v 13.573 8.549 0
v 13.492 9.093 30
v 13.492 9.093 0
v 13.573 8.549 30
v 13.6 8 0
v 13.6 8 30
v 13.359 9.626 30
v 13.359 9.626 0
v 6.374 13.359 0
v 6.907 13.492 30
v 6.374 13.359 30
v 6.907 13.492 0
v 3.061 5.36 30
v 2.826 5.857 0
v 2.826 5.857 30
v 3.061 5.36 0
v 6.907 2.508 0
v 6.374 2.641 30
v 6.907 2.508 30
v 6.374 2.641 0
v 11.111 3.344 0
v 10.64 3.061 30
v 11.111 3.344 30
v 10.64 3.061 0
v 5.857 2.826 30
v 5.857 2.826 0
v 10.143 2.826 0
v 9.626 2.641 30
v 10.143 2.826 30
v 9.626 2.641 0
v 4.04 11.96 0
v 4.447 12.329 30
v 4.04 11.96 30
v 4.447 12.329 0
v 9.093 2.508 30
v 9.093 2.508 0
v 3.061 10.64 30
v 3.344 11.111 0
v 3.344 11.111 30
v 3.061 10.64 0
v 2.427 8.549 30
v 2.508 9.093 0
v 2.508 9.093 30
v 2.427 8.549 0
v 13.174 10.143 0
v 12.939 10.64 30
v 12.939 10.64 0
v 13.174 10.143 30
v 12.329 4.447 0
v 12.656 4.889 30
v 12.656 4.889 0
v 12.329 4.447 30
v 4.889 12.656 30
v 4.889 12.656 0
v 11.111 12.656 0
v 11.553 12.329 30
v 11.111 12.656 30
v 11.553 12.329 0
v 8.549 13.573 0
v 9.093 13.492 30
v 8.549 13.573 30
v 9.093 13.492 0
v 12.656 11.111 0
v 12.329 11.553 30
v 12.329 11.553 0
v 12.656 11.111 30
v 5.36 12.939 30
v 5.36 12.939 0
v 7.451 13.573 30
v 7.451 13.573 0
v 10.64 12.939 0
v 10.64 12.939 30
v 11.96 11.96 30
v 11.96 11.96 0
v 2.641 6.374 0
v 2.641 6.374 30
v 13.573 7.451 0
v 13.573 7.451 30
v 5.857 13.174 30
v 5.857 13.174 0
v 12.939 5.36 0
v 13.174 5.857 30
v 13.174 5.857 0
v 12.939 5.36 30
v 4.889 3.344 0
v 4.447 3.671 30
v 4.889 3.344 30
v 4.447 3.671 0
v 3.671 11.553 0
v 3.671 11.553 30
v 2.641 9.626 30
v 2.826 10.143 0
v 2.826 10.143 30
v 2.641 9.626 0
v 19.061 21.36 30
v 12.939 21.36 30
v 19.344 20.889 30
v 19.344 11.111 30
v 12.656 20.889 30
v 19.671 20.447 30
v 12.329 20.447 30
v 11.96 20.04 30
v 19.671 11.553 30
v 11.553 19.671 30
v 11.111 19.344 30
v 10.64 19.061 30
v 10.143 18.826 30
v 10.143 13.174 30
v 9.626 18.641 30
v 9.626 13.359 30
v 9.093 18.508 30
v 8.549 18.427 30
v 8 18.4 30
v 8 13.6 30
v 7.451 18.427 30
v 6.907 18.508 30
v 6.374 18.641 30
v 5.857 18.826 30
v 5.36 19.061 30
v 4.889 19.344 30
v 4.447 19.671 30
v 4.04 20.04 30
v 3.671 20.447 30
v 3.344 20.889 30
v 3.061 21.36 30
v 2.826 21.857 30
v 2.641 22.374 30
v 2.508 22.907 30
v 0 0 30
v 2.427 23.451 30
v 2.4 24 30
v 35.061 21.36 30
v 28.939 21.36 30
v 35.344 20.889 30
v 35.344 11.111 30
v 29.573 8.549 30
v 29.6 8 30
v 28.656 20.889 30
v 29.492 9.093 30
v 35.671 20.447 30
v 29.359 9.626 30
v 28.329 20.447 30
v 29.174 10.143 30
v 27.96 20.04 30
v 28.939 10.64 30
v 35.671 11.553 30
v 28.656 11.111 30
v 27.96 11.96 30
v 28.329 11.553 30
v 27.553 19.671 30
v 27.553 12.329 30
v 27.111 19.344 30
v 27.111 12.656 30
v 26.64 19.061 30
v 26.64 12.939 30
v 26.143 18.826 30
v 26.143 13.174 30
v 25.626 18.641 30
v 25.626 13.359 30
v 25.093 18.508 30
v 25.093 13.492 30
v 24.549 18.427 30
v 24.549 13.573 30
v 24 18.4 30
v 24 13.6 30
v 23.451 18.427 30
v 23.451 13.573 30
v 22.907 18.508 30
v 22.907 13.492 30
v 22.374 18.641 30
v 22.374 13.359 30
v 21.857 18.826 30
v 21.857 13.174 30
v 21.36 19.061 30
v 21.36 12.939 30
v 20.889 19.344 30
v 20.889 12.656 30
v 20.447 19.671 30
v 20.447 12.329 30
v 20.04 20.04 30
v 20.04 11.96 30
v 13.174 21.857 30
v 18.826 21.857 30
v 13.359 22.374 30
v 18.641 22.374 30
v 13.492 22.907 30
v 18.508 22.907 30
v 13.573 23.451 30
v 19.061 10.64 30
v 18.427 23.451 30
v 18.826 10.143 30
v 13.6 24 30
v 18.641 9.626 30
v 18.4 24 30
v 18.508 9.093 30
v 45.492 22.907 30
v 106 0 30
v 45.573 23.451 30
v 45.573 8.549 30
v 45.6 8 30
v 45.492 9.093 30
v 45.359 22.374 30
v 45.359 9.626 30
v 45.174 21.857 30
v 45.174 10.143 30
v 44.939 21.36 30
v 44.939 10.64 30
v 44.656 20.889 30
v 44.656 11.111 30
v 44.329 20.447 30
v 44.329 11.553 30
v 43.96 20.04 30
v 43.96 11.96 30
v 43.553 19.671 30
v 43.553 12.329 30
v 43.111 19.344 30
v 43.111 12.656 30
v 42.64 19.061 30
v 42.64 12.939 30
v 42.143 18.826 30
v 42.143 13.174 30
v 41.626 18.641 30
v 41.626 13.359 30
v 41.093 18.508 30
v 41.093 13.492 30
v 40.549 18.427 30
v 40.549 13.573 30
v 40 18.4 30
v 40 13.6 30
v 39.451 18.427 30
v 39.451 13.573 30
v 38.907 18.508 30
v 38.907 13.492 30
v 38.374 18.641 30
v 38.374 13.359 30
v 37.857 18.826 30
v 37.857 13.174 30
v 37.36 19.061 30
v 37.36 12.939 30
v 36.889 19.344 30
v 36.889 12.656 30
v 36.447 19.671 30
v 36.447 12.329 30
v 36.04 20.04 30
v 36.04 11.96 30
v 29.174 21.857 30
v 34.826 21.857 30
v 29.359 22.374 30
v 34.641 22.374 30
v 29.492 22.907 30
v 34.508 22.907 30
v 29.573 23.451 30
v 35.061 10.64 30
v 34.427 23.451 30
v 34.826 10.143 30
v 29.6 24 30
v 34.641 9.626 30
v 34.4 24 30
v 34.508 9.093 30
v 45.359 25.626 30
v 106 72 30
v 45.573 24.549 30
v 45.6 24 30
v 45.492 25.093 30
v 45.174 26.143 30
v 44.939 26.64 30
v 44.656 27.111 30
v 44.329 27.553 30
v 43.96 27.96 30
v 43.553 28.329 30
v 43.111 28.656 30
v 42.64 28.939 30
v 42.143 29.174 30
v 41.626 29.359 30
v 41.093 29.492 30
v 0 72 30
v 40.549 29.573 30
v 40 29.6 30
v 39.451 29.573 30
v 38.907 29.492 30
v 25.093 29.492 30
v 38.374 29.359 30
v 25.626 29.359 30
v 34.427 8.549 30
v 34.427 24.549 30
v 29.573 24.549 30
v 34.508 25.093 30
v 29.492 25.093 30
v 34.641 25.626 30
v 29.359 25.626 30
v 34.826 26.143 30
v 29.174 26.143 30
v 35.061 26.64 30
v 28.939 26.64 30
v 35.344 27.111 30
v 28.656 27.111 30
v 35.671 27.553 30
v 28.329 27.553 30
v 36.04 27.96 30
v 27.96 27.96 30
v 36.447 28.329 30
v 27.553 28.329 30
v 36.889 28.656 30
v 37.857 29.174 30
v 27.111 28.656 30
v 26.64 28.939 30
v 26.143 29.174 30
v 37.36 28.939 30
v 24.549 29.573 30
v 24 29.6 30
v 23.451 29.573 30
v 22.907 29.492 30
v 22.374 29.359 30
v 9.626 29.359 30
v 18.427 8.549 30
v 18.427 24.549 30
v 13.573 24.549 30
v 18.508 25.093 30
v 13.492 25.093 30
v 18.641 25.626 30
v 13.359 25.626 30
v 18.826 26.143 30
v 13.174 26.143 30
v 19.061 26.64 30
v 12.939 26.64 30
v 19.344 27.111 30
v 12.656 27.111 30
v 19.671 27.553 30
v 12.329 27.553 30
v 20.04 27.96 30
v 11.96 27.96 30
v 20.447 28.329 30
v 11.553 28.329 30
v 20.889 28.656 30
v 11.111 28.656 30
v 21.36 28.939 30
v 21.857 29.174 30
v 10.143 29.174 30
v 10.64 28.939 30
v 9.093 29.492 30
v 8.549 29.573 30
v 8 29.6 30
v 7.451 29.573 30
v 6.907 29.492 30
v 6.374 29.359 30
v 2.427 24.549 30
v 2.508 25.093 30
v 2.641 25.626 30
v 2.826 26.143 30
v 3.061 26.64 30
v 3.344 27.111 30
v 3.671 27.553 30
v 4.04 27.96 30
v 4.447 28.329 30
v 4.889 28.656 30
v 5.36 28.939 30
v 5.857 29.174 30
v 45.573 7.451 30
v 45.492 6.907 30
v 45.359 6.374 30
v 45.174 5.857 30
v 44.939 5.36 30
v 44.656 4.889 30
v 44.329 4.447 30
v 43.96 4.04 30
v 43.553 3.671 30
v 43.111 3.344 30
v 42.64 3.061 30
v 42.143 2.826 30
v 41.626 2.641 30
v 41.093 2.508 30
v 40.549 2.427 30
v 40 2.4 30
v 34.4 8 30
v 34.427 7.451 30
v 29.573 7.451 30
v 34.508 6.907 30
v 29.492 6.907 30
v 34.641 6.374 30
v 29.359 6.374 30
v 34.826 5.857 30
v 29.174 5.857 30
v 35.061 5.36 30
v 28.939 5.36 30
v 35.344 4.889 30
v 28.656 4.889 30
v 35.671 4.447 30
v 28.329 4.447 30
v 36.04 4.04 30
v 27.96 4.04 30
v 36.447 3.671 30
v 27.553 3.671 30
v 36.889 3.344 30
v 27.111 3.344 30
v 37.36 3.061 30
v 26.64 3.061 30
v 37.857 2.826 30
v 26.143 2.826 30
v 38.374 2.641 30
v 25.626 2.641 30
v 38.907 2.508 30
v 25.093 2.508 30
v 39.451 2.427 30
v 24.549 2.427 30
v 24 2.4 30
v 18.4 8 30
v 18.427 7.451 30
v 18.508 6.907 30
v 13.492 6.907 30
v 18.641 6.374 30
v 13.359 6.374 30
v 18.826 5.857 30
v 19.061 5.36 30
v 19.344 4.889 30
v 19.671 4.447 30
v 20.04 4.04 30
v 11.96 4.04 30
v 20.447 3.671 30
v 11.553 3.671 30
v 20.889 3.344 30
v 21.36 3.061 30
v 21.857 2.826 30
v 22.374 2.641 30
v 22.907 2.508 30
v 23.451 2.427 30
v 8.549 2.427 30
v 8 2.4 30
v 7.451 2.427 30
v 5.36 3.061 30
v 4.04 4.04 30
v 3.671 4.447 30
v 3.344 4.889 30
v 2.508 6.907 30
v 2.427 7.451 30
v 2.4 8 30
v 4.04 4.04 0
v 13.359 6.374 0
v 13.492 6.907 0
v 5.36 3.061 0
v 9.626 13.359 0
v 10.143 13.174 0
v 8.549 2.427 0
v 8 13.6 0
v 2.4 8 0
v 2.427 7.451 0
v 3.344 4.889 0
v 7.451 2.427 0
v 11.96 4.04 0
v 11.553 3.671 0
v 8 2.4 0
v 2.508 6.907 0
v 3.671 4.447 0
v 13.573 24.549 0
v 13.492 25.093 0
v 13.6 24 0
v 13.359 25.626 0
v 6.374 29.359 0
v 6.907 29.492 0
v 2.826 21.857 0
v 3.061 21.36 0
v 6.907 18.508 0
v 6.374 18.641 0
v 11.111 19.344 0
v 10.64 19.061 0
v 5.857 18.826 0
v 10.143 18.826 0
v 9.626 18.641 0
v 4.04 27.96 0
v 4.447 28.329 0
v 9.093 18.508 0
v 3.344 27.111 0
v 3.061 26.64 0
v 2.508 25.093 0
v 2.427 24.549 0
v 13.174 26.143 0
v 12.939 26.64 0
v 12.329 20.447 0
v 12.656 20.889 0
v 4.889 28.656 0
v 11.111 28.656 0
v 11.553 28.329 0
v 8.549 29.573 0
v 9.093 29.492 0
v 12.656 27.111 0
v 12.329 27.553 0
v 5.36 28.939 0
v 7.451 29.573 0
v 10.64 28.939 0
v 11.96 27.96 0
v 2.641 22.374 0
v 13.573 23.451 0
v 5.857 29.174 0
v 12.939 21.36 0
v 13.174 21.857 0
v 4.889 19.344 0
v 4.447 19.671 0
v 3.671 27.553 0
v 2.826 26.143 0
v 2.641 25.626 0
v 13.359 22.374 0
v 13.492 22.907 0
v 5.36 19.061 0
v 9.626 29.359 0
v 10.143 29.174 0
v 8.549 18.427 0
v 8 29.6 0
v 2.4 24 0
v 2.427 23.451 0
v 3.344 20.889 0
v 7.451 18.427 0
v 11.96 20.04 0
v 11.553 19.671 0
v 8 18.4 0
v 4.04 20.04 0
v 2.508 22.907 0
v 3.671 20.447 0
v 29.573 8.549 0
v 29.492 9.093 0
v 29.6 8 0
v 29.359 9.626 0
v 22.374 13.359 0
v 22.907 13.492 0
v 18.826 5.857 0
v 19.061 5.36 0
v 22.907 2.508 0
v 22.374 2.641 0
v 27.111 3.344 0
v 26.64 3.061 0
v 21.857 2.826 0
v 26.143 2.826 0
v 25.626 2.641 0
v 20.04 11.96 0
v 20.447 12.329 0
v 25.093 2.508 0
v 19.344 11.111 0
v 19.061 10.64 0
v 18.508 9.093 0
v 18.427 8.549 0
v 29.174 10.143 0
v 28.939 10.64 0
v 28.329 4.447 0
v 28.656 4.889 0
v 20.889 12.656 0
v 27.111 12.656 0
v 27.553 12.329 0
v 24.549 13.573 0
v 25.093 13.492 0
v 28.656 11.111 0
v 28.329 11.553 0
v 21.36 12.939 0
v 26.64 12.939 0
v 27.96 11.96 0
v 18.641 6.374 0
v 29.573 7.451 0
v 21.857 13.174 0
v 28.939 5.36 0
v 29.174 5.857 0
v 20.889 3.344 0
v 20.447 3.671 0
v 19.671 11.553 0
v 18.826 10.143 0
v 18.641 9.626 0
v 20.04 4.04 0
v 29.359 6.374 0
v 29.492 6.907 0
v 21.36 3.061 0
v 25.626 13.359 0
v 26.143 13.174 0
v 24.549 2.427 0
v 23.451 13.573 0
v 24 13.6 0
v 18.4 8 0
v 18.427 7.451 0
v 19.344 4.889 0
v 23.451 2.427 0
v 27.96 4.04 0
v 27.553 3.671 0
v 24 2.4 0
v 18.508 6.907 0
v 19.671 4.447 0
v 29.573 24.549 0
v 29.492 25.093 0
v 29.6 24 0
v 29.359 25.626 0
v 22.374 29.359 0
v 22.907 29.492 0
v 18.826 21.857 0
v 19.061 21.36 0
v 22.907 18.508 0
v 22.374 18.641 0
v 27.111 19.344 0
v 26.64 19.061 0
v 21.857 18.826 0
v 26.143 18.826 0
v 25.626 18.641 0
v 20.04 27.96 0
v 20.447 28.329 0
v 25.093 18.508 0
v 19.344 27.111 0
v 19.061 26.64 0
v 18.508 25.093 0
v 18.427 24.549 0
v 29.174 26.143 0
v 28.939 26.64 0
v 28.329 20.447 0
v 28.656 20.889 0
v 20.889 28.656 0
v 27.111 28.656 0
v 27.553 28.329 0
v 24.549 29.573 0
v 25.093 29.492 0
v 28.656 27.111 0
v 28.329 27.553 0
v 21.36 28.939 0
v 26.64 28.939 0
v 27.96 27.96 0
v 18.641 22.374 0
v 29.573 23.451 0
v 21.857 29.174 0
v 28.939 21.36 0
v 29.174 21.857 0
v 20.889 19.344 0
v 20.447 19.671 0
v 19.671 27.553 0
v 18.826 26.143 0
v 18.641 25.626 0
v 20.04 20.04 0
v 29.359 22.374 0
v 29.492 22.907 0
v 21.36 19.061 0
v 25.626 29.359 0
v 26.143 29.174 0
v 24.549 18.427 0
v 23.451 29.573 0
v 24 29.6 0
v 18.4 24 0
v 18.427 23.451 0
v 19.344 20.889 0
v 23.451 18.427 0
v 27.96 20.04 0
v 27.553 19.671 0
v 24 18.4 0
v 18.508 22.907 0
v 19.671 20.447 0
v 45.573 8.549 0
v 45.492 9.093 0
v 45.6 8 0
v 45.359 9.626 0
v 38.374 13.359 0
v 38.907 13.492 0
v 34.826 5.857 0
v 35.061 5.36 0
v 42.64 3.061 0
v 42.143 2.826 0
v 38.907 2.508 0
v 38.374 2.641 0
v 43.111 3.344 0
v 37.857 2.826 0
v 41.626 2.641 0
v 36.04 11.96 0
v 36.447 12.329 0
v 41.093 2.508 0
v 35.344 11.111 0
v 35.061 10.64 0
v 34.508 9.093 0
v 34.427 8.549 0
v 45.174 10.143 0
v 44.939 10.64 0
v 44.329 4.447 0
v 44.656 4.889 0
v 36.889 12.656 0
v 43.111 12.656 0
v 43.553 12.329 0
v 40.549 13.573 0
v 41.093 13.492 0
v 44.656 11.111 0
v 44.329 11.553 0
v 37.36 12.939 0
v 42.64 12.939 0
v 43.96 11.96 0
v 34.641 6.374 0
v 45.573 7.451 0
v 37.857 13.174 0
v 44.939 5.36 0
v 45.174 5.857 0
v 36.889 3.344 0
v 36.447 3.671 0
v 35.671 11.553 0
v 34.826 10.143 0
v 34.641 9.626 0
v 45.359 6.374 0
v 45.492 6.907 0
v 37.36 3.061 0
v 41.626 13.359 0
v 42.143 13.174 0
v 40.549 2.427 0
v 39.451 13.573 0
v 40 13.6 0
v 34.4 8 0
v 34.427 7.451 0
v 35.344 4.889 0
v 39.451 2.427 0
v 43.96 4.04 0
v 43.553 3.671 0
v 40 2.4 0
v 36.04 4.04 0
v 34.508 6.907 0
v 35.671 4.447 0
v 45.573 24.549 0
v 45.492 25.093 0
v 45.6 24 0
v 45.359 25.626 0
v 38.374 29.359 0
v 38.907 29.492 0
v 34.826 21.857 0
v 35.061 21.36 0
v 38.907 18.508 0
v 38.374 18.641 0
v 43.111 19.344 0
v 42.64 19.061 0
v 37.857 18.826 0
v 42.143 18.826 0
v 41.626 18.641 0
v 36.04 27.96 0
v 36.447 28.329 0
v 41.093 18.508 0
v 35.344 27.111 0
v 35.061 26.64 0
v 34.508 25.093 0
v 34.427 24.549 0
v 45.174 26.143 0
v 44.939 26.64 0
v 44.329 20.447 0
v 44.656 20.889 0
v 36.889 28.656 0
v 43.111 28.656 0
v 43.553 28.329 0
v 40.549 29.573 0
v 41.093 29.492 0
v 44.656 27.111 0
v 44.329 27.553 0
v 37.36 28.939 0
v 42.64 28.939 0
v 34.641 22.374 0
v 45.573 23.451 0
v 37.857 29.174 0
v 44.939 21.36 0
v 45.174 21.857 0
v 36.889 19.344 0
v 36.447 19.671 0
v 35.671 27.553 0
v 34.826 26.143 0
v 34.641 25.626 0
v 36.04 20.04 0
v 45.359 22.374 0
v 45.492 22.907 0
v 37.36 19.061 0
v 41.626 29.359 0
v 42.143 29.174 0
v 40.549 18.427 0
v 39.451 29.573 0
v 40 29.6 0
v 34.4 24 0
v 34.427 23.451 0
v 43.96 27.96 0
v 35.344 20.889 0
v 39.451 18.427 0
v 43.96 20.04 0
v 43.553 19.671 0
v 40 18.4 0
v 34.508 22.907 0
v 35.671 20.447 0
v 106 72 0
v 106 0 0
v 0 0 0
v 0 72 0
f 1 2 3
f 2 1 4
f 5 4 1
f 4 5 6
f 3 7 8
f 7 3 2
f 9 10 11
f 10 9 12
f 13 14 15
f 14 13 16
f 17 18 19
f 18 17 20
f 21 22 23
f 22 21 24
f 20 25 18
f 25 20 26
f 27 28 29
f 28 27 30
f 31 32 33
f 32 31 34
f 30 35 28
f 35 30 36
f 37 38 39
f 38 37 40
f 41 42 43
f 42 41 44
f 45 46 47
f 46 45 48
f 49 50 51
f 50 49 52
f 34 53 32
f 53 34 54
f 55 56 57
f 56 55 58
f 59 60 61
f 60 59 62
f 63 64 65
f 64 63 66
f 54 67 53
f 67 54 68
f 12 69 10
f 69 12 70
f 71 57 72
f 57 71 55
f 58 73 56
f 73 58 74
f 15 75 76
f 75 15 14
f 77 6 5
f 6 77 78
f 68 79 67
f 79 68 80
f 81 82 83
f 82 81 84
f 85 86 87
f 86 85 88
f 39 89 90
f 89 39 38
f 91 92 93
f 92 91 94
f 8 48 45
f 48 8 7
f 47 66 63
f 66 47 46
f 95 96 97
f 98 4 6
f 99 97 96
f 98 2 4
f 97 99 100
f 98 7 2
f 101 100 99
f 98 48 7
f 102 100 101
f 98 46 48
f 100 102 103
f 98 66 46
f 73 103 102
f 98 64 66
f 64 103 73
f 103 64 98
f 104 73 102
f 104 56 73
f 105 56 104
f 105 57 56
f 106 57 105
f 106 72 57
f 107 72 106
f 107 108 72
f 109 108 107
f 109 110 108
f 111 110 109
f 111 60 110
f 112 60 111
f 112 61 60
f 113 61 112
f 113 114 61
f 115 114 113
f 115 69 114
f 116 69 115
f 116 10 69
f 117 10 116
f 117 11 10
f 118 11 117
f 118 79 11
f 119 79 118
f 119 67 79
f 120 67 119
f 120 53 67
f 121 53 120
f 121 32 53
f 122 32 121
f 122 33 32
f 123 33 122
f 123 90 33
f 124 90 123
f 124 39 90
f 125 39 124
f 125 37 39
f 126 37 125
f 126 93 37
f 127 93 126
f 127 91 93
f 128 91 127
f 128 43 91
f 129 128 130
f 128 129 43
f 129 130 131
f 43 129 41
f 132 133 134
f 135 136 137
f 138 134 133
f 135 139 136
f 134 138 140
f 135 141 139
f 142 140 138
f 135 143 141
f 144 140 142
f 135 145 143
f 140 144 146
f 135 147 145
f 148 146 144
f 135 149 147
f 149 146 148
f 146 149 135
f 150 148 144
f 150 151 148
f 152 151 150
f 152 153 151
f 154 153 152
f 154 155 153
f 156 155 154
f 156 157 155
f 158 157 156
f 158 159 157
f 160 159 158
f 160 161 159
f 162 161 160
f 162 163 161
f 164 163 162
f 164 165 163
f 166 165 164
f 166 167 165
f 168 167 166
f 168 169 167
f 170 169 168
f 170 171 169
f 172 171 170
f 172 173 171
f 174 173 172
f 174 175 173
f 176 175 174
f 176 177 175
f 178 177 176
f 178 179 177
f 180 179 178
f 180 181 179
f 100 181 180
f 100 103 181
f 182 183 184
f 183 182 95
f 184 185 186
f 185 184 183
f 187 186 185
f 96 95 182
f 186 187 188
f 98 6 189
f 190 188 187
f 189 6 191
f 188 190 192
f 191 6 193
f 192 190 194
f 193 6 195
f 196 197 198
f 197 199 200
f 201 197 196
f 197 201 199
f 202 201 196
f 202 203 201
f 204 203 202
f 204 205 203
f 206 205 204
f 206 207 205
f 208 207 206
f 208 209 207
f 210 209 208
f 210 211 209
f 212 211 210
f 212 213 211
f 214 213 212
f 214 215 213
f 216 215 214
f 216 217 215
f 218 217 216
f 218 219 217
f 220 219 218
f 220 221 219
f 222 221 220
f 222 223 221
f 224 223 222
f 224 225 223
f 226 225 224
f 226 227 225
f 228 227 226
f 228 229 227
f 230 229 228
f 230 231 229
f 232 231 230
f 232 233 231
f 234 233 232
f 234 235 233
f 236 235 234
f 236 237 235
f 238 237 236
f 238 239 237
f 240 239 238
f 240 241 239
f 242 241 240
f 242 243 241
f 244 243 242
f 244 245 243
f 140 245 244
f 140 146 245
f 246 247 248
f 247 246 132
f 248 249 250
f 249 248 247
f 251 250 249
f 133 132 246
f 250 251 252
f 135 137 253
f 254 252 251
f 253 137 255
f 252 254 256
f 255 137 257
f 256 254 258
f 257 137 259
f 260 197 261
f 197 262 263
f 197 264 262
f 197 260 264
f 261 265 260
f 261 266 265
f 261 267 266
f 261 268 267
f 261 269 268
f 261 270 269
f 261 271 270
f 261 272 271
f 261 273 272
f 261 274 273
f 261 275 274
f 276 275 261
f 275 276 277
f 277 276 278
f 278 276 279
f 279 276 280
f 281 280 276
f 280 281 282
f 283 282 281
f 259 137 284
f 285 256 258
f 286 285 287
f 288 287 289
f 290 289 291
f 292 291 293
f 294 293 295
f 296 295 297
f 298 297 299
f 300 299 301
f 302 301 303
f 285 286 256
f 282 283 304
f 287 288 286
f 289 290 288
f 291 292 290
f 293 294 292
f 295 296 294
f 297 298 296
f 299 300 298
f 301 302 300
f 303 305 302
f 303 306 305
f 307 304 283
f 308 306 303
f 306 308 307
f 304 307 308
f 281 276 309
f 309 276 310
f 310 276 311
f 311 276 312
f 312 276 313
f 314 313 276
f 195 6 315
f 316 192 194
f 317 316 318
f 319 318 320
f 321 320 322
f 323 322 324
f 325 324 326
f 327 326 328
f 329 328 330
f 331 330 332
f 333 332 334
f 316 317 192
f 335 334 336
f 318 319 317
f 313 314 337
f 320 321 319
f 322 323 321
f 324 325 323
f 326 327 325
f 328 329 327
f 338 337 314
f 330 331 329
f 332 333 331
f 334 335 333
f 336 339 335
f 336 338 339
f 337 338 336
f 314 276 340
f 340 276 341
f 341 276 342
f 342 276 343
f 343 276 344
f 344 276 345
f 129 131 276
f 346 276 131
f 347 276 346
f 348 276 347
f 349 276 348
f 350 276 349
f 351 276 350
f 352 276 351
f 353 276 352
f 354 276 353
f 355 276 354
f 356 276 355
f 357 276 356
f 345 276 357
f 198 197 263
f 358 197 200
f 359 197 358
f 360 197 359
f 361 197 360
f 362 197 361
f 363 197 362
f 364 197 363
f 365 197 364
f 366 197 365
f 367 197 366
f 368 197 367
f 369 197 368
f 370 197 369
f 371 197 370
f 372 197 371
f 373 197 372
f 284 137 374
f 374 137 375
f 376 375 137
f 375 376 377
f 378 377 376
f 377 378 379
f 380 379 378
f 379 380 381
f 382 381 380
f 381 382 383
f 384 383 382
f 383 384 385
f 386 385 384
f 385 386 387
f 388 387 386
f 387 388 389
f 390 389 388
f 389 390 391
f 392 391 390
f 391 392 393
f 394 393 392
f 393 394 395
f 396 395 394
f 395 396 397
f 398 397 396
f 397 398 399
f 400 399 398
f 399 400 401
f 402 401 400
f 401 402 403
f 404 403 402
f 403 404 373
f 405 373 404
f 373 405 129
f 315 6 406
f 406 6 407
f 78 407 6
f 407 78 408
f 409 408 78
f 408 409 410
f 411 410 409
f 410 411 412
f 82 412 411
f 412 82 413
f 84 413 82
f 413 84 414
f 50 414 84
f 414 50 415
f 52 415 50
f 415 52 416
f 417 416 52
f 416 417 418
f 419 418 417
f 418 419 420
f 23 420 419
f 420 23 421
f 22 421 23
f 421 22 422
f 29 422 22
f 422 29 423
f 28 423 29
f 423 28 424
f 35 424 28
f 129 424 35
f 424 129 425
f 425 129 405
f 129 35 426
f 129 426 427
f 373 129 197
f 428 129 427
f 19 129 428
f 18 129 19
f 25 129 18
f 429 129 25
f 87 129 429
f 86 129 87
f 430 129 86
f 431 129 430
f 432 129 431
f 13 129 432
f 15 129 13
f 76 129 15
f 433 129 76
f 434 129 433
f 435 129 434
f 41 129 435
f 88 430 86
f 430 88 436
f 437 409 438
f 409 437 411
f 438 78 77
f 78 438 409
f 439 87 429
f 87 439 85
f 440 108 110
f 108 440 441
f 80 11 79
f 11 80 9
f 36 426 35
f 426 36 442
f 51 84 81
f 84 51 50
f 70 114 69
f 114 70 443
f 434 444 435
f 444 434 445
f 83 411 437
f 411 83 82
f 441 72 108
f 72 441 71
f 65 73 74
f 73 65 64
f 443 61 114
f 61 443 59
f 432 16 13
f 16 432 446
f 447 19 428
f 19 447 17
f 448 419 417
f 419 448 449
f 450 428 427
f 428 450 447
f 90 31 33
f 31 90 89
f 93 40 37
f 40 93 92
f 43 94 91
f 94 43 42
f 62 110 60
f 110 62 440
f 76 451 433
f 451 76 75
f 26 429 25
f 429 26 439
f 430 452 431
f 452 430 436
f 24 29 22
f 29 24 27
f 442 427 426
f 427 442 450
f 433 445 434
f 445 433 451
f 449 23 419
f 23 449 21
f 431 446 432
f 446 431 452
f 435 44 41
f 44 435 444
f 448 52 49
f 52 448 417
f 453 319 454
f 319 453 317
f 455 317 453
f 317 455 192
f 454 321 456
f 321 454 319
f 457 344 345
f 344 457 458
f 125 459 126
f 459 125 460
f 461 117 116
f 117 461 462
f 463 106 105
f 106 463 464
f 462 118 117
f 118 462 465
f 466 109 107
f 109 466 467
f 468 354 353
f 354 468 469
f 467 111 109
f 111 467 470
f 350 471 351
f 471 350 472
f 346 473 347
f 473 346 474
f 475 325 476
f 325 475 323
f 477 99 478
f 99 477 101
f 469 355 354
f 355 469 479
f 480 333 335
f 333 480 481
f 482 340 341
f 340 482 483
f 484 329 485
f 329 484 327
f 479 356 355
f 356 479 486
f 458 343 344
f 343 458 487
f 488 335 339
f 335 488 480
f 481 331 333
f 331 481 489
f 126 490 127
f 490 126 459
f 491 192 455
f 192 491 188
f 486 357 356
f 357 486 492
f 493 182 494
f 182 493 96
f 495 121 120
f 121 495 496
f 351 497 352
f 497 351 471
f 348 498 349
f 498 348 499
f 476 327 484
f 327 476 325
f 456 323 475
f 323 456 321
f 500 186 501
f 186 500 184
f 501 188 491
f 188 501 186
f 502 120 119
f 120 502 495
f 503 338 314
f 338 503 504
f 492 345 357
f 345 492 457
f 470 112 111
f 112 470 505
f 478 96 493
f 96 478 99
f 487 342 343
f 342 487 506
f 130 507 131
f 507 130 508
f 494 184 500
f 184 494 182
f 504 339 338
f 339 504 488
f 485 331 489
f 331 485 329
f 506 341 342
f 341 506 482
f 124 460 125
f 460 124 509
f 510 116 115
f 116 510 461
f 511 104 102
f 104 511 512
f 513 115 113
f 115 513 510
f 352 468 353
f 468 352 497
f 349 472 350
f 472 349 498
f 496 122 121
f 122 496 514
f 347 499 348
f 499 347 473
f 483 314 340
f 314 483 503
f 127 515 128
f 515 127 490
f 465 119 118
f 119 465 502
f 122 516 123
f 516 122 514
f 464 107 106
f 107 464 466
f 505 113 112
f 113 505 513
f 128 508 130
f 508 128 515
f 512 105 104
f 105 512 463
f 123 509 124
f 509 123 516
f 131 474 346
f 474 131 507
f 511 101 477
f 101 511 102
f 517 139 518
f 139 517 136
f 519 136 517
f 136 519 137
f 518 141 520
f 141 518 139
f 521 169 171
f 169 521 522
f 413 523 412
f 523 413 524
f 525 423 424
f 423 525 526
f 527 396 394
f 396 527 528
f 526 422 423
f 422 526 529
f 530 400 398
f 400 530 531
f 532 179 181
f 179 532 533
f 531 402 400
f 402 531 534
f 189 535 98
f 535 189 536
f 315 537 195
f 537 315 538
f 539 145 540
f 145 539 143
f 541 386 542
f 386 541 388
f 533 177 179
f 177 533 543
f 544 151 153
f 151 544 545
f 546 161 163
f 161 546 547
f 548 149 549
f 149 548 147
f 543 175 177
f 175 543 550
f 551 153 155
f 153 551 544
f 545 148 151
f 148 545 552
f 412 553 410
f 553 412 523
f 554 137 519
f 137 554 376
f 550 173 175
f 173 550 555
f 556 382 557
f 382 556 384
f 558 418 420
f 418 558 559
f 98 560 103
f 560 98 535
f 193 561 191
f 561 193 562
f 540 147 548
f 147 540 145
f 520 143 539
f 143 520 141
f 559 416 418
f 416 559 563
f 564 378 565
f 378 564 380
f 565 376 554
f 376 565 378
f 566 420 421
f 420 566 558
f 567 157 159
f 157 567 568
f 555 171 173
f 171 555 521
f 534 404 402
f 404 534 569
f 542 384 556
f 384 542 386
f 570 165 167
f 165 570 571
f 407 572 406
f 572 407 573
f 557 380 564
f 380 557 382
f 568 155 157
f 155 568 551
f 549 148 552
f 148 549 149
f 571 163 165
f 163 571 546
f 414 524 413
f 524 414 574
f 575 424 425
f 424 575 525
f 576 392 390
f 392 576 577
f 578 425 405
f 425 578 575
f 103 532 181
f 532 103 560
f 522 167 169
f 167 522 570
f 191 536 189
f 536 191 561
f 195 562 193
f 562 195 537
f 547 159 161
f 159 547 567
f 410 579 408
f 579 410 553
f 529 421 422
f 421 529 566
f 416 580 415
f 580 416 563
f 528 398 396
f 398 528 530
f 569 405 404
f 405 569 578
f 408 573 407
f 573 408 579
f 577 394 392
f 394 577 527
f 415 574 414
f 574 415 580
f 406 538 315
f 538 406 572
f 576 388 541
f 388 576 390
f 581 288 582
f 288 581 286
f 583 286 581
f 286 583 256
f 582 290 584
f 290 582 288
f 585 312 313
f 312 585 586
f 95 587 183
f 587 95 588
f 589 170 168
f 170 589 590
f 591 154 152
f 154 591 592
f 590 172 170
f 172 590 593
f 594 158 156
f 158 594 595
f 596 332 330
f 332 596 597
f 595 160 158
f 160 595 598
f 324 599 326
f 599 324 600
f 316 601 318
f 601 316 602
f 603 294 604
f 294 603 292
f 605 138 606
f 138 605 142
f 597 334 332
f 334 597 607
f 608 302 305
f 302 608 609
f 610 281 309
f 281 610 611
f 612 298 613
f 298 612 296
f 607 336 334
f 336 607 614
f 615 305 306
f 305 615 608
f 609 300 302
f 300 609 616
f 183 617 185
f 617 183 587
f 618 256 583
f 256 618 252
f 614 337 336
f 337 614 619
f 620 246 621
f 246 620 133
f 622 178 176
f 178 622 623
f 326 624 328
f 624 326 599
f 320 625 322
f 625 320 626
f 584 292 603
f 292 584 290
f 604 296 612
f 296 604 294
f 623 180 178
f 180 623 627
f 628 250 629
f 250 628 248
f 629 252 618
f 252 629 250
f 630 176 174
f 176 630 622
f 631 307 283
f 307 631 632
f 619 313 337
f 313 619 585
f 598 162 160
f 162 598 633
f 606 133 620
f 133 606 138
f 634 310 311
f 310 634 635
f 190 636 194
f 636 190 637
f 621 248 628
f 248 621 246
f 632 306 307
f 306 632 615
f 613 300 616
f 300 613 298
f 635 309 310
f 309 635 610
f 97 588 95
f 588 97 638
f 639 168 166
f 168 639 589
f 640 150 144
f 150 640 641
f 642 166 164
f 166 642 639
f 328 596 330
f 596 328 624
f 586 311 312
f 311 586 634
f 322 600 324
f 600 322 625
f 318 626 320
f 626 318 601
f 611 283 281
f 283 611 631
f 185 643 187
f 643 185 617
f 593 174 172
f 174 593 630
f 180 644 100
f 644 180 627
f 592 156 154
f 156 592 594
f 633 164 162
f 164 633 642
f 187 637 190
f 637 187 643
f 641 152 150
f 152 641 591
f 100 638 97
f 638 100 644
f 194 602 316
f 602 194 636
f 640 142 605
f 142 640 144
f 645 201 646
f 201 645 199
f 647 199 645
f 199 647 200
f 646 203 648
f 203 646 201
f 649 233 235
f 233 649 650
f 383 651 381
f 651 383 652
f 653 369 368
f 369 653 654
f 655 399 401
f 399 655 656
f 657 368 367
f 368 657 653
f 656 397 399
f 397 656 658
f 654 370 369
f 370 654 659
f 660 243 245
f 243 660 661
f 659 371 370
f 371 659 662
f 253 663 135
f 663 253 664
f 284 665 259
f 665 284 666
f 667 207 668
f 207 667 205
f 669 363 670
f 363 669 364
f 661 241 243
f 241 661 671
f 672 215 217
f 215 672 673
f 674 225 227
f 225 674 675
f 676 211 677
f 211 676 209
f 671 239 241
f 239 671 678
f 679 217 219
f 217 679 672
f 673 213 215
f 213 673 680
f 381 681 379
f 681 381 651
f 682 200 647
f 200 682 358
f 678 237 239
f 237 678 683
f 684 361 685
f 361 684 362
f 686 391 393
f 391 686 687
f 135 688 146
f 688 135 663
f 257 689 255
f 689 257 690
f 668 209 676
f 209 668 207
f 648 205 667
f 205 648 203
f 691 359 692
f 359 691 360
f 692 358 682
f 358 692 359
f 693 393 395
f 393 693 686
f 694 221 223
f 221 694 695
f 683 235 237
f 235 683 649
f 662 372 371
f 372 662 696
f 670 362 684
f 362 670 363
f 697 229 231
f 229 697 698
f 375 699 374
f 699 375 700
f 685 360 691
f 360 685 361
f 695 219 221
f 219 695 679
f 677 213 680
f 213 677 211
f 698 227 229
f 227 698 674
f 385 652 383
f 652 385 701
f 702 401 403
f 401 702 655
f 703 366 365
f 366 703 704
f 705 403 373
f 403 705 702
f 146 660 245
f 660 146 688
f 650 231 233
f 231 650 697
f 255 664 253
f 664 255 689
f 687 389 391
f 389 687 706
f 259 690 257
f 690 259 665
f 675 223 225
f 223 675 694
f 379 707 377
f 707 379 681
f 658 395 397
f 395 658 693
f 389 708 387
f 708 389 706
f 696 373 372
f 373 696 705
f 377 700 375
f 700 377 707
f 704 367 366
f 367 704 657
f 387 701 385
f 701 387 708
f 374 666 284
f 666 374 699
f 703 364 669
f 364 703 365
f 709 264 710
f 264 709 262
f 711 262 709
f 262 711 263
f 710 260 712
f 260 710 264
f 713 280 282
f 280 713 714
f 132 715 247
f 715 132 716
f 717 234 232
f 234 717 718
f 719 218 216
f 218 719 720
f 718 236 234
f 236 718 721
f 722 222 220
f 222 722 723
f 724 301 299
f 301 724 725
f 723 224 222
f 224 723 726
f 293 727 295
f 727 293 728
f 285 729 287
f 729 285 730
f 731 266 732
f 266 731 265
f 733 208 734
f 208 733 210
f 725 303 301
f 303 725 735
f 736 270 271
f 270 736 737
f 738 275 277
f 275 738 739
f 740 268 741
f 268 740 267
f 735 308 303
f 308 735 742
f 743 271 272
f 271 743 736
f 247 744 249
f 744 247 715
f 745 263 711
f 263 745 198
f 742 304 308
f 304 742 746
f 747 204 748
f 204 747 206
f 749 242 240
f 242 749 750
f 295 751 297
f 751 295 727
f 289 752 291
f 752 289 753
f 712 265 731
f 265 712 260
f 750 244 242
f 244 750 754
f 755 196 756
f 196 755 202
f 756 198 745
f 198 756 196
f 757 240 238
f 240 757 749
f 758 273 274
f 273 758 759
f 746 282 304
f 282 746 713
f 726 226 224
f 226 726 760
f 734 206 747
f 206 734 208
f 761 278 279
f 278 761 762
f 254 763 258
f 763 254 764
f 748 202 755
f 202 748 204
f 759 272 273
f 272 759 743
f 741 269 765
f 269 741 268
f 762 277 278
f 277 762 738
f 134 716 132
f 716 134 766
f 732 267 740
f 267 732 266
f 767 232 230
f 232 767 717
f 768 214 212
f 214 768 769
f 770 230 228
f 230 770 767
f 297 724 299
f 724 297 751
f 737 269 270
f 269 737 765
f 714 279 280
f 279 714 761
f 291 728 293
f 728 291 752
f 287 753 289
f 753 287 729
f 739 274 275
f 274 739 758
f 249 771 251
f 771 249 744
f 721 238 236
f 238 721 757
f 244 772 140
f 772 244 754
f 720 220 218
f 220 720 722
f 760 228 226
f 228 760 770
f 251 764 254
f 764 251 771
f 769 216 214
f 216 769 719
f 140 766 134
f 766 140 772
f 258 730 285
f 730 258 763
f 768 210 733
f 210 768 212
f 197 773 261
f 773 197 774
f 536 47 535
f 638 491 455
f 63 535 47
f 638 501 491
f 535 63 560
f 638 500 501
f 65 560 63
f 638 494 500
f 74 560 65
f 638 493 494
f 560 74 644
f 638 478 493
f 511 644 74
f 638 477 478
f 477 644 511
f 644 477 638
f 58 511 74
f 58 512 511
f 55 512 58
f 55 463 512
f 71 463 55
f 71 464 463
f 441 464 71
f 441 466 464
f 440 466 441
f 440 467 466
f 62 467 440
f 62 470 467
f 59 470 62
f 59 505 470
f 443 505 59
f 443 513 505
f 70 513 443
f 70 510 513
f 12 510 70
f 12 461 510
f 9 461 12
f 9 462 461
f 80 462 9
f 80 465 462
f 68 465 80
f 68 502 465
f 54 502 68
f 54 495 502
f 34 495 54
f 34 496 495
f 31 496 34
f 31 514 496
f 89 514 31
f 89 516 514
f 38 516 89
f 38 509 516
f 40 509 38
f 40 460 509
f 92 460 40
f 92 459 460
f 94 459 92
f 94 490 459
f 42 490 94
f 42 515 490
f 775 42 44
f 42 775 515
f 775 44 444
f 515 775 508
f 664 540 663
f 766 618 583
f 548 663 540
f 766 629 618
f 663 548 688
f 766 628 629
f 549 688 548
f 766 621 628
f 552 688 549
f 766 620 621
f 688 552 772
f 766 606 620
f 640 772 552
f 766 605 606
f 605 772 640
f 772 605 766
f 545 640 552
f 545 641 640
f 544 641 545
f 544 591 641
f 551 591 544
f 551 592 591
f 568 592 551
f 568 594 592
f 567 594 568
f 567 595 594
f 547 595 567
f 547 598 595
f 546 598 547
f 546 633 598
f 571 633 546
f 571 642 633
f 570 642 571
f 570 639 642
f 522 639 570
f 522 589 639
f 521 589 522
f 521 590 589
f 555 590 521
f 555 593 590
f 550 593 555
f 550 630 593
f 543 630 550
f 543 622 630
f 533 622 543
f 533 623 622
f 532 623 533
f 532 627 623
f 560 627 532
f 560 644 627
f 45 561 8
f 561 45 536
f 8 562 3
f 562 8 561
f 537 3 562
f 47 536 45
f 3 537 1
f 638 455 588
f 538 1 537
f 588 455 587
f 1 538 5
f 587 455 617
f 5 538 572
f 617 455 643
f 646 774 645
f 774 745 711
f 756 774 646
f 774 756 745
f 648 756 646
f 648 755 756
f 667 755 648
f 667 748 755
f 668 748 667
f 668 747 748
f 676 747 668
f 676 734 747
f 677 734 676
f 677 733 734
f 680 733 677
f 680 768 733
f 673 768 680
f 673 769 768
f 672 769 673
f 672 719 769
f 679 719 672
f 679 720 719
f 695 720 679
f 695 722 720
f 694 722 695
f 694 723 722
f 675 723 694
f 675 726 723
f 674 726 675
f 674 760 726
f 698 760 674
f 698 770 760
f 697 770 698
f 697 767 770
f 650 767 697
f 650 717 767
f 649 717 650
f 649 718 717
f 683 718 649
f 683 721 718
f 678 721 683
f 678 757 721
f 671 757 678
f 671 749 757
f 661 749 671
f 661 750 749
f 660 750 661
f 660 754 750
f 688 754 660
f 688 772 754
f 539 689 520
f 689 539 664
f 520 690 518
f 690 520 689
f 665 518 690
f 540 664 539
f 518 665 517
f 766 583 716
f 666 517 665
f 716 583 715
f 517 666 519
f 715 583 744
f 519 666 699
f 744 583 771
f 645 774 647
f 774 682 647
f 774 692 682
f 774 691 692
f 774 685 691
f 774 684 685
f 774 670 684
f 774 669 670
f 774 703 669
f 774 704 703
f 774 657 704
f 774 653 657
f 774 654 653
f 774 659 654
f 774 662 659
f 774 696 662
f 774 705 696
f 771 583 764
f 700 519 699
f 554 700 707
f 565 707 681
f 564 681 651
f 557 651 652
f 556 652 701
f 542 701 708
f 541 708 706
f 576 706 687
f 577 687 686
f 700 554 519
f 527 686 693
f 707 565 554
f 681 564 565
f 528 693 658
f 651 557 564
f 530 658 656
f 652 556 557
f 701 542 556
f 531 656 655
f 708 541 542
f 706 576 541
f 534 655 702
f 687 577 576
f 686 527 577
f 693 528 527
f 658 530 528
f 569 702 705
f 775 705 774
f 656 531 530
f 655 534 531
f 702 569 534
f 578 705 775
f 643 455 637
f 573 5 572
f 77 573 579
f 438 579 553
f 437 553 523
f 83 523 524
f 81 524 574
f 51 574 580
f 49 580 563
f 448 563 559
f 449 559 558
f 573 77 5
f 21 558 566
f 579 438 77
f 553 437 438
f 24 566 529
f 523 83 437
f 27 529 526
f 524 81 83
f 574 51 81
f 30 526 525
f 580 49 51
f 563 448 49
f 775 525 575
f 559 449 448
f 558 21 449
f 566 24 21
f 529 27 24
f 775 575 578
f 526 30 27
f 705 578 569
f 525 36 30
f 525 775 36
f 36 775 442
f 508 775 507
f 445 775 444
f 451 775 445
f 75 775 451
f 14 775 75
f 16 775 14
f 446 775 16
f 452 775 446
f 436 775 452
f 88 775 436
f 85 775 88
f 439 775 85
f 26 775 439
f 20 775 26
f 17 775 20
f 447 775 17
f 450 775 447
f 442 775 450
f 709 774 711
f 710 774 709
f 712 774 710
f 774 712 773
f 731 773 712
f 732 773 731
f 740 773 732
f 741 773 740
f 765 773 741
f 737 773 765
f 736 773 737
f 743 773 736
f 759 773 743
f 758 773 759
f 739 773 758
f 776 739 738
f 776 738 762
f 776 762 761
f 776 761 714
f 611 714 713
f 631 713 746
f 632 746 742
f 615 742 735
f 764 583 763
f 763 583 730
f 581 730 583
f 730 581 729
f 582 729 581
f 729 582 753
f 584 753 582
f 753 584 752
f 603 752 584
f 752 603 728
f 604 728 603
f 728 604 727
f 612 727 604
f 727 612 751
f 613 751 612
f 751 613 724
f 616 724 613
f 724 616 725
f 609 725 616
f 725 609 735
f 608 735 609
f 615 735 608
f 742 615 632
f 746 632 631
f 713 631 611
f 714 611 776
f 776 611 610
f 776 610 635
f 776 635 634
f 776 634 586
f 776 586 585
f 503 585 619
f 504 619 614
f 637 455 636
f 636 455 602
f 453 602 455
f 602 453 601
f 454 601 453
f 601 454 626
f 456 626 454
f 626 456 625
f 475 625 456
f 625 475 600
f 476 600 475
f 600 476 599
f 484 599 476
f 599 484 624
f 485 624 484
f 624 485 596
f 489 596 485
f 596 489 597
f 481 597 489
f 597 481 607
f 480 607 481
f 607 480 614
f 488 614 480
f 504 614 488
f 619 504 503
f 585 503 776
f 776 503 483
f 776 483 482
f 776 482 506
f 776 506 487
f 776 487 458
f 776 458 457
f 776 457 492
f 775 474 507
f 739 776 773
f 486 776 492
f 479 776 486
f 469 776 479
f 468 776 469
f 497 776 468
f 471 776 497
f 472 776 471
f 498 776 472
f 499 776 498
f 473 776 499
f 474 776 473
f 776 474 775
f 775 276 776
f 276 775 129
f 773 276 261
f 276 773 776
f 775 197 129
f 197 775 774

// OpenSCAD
// Dimensions for 1.5 mL microcentrifuge tube rack
// Block size
BLOCK_X = 106;
BLOCK_Y = 72;
BLOCK_Z = 30;

// Hole grid parameters
GRID_ROWS = 4;      // Along Y
GRID_COLS = 6;      // Along X
SPACING_X = 16;     // Centre-to-centre along X
SPACING_Y = 16;     // Centre-to-centre along Y
HOLE_DIAM = 11.2;   // Hole diameter
HOLE_DEPTH = 25;    // Depth of hole from top
FLOOR_THICK = 5;    // Solid floor thickness (BLOCK_Z - HOLE_DEPTH = 30 - 25 = 5)

// Calculate grid offset to centre the grid on the block
// Total width of grid in X: (6-1)*16 = 80 mm. Offset from centre: 80/2 = 40 mm.
// Total width of grid in Y: (4-1)*16 = 48 mm. Offset from centre: 48/2 = 24 mm.
GRID_OFFSET_X = (GRID_COLS - 1) * SPACING_X / 2;
GRID_OFFSET_Y = (GRID_ROWS - 1) * SPACING_Y / 2;

// Hole radius
HOLE_R = HOLE_DIAM / 2;

// Clearance for difference operation
CLEARANCE = 0.05;

// Total height of the cutting cylinder (hole depth + floor thickness + extra for clean cut)
// The hole is 25mm deep, leaving 5mm floor. The cylinder must go through the 5mm floor 
// and extend slightly below z=0 to ensure the bottom face is cleanly cut.
// Cylinder bottom at z = -0.1, top at z = HOLE_DEPTH + FLOOR_THICK + 0.1 = 30.1
CUT_CYL_H = HOLE_DEPTH + FLOOR_THICK + 0.1;
CUT_CYL_Z_BOTTOM = -0.1;

// Main block
difference() {
    // Base block
    cube([BLOCK_X, BLOCK_Y, BLOCK_Z], center = false);
    
    // Holes
    for (i = [0 : GRID_COLS - 1]) {
        for (j = [0 : GRID_ROWS - 1]) {
            // Calculate hole position
            // X: Start from -GRID_OFFSET_X, step by SPACING_X
            hx = -GRID_OFFSET_X + i * SPACING_X;
            // Y: Start from -GRID_OFFSET_Y, step by SPACING_Y
            hy = -GRID_OFFSET_Y + j * SPACING_Y;
            
            // Cut hole
            // Cylinder extends from slightly below the block to slightly above the top surface
            // to ensure clean boolean operations.
            translate([hx, hy, CUT_CYL_Z_BOTTOM]) {
                $fn = 64;
                cylinder(h = CUT_CYL_H, d = HOLE_DIAM, center = false);
            }
        }
    }
}
